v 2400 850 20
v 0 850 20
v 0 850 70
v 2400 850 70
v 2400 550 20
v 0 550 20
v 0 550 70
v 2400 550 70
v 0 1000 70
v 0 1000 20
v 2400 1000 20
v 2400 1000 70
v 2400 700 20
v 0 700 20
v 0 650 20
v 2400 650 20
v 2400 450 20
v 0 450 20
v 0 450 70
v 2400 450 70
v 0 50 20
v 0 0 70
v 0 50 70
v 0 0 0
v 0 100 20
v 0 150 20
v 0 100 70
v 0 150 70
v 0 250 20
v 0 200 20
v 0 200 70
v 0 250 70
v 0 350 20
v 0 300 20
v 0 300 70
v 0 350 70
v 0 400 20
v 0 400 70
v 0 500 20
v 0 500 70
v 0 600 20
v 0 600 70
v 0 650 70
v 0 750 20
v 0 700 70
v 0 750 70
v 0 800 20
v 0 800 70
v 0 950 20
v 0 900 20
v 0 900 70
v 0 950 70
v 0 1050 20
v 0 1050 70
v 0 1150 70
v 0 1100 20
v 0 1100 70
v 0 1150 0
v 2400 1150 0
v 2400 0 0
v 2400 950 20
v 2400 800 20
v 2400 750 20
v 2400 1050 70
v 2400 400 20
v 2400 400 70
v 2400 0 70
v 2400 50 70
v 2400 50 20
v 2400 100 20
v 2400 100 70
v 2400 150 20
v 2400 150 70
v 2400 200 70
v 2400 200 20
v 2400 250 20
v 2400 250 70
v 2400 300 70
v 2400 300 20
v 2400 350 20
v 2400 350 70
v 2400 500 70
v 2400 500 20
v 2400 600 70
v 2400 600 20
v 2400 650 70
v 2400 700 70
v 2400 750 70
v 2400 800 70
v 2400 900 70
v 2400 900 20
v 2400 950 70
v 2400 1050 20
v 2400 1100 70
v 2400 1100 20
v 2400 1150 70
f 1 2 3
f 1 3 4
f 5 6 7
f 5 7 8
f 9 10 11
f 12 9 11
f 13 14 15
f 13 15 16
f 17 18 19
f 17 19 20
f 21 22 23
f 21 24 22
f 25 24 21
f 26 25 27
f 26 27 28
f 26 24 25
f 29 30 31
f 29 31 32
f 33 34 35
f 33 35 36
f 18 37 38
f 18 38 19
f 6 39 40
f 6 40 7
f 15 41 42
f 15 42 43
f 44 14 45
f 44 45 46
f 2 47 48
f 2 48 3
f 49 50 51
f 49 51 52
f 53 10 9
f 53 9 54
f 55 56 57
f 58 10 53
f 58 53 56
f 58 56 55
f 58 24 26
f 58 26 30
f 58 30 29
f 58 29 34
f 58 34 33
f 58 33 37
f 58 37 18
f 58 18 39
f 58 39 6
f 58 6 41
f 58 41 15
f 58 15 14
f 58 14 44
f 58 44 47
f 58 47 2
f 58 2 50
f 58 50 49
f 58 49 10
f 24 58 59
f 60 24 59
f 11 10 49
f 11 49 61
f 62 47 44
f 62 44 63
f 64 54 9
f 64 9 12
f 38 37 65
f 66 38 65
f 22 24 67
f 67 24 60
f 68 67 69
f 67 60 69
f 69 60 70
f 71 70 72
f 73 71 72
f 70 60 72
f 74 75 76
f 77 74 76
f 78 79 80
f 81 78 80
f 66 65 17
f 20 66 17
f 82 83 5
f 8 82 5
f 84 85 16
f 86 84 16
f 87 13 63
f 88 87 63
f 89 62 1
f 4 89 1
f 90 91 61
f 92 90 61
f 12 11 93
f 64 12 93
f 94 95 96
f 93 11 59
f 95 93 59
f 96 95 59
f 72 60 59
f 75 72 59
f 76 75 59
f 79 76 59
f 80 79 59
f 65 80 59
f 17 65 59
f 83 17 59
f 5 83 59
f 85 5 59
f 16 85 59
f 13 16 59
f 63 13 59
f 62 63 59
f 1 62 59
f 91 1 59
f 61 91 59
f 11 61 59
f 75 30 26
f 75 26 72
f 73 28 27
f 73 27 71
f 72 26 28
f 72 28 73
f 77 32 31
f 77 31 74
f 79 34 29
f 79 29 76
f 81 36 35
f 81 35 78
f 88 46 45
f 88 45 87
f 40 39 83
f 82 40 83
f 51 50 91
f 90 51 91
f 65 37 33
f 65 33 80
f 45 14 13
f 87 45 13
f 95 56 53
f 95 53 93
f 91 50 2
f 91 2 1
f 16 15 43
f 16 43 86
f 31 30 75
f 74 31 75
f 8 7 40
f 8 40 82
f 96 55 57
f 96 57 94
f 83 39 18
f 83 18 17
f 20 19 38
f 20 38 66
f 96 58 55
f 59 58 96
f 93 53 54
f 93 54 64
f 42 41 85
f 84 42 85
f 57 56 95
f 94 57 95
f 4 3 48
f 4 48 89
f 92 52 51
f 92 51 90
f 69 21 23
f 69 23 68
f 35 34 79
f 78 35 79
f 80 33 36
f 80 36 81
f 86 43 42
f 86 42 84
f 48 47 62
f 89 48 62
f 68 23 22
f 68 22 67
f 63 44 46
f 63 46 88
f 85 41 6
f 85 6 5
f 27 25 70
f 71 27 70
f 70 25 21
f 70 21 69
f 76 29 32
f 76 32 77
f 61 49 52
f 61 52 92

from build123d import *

# Parameters (mm, degrees)
SKETCH_1_W             = 2400
SKETCH_1_H             = 1150
EXTRUDE_1_DEPTH        = 20
SKETCH_2_W             = 2400
SKETCH_2_H             = 50
EXTRUDE_2_DEPTH        = 50
PATTERN_LINEAR_1_COUNT = 12
PATTERN_LINEAR_1_PITCH = 100


with BuildPart() as part:
    # Эскиз1 → Бобышка-Вытянуть1 (new body)
    with BuildSketch(Plane.XY):
        with Locations((1200, 575)):
            Rectangle(SKETCH_1_W, SKETCH_1_H)
    extrude(amount=EXTRUDE_1_DEPTH)

    # Эскиз2 → Бобышка-Вытянуть2 (add)
    with BuildSketch(Plane.XY.offset(20)):
        with Locations((1200, 1125)):
            Rectangle(SKETCH_2_W, SKETCH_2_H)
    extrude_2 = extrude(amount=EXTRUDE_2_DEPTH)

    # Линейный массив1: Бобышка-Вытянуть2 ×12
    with Locations(*[(0, -i * PATTERN_LINEAR_1_PITCH, 0) for i in range(1, PATTERN_LINEAR_1_COUNT)]):
        add(extrude_2)


solid = part.part
